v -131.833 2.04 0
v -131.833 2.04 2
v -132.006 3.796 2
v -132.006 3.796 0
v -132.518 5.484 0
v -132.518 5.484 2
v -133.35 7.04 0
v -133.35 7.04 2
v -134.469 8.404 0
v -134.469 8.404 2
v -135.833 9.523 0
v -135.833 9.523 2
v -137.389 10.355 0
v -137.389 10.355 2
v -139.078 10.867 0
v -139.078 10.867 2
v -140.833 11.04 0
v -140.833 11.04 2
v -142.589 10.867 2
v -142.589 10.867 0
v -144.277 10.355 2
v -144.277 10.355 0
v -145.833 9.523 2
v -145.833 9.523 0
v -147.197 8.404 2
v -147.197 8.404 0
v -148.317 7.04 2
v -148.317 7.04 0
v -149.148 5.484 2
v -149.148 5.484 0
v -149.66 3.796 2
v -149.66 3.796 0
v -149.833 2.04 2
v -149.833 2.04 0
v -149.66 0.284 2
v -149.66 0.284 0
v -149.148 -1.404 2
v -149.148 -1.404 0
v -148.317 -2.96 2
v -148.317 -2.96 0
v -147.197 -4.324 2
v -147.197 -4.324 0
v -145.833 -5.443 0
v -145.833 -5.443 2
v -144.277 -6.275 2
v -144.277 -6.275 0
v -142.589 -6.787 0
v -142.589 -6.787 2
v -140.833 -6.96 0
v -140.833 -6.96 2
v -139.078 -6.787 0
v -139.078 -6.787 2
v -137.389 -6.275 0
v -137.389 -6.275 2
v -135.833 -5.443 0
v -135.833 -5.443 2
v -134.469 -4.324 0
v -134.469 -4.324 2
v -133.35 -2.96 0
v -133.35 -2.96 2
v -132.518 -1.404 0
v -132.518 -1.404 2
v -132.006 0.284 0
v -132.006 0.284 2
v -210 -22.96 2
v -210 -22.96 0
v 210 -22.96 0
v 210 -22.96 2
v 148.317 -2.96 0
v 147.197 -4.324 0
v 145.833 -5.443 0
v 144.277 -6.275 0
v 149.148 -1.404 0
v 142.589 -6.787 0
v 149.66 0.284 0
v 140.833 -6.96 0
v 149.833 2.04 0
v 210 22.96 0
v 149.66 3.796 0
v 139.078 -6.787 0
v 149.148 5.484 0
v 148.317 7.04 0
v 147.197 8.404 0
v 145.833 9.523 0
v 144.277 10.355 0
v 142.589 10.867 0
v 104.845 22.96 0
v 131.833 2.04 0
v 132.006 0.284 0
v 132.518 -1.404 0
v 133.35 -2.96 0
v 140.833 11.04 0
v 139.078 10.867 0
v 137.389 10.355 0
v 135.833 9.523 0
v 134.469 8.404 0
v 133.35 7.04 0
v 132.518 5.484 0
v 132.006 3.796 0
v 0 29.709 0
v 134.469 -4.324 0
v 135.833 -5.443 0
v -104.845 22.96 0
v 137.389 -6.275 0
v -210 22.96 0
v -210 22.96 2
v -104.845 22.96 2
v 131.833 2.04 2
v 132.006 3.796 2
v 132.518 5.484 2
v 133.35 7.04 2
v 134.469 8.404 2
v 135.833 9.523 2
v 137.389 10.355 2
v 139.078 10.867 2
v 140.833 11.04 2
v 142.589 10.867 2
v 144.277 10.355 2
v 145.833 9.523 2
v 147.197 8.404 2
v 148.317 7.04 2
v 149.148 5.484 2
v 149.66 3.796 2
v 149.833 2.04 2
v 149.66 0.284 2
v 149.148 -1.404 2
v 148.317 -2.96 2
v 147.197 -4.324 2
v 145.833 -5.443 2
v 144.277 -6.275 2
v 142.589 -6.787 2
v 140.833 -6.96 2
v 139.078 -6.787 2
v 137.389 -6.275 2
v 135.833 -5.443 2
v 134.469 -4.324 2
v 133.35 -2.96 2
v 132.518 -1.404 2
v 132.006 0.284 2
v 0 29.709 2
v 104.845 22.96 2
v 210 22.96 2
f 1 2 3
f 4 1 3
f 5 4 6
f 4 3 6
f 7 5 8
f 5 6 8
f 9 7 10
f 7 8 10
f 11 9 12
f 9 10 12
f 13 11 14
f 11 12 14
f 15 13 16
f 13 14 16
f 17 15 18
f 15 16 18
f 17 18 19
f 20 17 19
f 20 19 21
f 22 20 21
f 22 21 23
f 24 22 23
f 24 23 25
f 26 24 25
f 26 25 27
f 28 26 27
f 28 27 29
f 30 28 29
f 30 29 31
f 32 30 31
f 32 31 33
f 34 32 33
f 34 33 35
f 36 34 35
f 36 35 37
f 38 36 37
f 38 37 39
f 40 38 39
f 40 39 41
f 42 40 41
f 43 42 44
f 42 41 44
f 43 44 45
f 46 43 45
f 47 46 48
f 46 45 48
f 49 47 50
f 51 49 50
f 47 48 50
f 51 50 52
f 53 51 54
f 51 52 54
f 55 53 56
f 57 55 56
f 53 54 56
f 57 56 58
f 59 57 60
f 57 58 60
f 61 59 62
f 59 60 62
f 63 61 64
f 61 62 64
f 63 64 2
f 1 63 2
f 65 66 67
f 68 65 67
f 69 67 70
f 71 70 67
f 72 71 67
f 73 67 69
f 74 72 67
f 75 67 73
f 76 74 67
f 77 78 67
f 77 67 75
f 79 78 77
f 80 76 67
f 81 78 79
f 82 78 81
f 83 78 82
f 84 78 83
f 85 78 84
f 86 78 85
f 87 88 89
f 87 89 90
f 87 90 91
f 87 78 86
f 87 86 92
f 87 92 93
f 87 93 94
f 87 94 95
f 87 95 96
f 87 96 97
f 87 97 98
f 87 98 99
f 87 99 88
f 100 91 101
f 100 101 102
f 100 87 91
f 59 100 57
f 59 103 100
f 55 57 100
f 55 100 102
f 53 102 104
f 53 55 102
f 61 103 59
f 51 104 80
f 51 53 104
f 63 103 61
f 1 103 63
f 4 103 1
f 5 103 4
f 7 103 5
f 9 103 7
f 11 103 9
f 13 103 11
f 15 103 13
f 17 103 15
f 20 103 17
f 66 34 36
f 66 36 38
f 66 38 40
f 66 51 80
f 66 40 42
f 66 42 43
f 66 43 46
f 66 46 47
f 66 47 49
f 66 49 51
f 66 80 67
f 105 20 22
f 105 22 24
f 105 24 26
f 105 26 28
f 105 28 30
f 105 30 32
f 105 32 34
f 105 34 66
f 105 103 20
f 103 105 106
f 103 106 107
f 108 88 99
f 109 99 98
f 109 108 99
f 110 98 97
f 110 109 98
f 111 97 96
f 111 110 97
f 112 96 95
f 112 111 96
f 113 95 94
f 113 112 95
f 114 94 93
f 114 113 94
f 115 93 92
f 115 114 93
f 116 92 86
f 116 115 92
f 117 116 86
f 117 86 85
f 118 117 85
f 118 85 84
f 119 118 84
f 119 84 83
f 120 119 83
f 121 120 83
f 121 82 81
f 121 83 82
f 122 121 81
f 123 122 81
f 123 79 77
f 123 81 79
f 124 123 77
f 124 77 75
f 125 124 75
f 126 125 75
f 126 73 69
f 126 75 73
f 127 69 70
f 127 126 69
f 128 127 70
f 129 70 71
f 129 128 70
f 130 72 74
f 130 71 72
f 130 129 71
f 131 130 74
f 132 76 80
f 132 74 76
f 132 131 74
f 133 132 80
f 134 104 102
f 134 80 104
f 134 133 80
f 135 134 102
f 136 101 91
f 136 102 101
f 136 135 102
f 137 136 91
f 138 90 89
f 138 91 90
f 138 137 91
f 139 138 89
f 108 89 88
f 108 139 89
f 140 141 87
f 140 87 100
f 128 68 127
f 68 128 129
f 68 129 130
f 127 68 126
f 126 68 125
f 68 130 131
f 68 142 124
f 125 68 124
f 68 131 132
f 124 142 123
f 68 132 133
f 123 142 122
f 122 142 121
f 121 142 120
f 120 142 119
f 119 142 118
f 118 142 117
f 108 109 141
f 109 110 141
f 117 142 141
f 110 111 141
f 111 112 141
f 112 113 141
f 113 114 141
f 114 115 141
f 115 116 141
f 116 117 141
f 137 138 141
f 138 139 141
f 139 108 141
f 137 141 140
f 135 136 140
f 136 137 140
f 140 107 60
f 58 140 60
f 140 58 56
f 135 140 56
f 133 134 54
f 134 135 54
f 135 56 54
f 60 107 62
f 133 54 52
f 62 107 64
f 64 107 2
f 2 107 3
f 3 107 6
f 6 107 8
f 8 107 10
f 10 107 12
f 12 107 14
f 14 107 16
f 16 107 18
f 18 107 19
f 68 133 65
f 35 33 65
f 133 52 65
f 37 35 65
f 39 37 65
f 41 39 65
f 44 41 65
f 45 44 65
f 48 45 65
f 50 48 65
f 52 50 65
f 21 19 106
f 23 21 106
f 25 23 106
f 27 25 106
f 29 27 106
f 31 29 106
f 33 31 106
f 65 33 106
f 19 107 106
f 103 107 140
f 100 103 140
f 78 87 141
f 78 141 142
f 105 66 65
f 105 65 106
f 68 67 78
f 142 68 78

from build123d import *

# Parameters (mm, degrees)
SCHIZZO1_W                   = 420
SCHIZZO1_H                   = 45.92
PIASTRABASE_DEPTH            = 2
SCHIZZO2_R                   = 9
FOROTUBOMOTORE_DEPTH         = 212.260885163
ESTRUSIONE_ESTRUSIONE1_DEPTH = 2


with BuildPart() as part:
    # Schizzo1 → PiastraBase (new body)
    with BuildSketch(Plane.XY):
        Rectangle(SCHIZZO1_W, SCHIZZO1_H)
    extrude(amount=PIASTRABASE_DEPTH)

    # Schizzo2 → ForoTuboMotore (cut, through all)
    with BuildSketch(Plane.XY.offset(2)):
        with Locations((-140.833333333, 2.04)):
            Circle(SCHIZZO2_R)
    forotubomotore = extrude(amount=-FOROTUBOMOTORE_DEPTH, mode=Mode.SUBTRACT)

    # Specchia1: ForoTuboMotore across plane
    add(forotubomotore.mirror(Plane(origin=(0, 0, 0), x_dir=(0, 0, 1), z_dir=(1, 0, 0))), mode=Mode.SUBTRACT)

    # Schizzo4 → Estrusione-Estrusione1 (add)
    with BuildSketch(Plane.XY.offset(2)):
        Polygon((104.844657179, 22.96), (0, 29.70924382), (0, 22.96), align=None)
    estrusione_estrusione1 = extrude(amount=-ESTRUSIONE_ESTRUSIONE1_DEPTH)

    # Specchia2: Estrusione-Estrusione1 across plane
    add(estrusione_estrusione1.mirror(Plane(origin=(0, 0, 0), x_dir=(0, 0, 1), z_dir=(1, 0, 0))))


solid = part.part
